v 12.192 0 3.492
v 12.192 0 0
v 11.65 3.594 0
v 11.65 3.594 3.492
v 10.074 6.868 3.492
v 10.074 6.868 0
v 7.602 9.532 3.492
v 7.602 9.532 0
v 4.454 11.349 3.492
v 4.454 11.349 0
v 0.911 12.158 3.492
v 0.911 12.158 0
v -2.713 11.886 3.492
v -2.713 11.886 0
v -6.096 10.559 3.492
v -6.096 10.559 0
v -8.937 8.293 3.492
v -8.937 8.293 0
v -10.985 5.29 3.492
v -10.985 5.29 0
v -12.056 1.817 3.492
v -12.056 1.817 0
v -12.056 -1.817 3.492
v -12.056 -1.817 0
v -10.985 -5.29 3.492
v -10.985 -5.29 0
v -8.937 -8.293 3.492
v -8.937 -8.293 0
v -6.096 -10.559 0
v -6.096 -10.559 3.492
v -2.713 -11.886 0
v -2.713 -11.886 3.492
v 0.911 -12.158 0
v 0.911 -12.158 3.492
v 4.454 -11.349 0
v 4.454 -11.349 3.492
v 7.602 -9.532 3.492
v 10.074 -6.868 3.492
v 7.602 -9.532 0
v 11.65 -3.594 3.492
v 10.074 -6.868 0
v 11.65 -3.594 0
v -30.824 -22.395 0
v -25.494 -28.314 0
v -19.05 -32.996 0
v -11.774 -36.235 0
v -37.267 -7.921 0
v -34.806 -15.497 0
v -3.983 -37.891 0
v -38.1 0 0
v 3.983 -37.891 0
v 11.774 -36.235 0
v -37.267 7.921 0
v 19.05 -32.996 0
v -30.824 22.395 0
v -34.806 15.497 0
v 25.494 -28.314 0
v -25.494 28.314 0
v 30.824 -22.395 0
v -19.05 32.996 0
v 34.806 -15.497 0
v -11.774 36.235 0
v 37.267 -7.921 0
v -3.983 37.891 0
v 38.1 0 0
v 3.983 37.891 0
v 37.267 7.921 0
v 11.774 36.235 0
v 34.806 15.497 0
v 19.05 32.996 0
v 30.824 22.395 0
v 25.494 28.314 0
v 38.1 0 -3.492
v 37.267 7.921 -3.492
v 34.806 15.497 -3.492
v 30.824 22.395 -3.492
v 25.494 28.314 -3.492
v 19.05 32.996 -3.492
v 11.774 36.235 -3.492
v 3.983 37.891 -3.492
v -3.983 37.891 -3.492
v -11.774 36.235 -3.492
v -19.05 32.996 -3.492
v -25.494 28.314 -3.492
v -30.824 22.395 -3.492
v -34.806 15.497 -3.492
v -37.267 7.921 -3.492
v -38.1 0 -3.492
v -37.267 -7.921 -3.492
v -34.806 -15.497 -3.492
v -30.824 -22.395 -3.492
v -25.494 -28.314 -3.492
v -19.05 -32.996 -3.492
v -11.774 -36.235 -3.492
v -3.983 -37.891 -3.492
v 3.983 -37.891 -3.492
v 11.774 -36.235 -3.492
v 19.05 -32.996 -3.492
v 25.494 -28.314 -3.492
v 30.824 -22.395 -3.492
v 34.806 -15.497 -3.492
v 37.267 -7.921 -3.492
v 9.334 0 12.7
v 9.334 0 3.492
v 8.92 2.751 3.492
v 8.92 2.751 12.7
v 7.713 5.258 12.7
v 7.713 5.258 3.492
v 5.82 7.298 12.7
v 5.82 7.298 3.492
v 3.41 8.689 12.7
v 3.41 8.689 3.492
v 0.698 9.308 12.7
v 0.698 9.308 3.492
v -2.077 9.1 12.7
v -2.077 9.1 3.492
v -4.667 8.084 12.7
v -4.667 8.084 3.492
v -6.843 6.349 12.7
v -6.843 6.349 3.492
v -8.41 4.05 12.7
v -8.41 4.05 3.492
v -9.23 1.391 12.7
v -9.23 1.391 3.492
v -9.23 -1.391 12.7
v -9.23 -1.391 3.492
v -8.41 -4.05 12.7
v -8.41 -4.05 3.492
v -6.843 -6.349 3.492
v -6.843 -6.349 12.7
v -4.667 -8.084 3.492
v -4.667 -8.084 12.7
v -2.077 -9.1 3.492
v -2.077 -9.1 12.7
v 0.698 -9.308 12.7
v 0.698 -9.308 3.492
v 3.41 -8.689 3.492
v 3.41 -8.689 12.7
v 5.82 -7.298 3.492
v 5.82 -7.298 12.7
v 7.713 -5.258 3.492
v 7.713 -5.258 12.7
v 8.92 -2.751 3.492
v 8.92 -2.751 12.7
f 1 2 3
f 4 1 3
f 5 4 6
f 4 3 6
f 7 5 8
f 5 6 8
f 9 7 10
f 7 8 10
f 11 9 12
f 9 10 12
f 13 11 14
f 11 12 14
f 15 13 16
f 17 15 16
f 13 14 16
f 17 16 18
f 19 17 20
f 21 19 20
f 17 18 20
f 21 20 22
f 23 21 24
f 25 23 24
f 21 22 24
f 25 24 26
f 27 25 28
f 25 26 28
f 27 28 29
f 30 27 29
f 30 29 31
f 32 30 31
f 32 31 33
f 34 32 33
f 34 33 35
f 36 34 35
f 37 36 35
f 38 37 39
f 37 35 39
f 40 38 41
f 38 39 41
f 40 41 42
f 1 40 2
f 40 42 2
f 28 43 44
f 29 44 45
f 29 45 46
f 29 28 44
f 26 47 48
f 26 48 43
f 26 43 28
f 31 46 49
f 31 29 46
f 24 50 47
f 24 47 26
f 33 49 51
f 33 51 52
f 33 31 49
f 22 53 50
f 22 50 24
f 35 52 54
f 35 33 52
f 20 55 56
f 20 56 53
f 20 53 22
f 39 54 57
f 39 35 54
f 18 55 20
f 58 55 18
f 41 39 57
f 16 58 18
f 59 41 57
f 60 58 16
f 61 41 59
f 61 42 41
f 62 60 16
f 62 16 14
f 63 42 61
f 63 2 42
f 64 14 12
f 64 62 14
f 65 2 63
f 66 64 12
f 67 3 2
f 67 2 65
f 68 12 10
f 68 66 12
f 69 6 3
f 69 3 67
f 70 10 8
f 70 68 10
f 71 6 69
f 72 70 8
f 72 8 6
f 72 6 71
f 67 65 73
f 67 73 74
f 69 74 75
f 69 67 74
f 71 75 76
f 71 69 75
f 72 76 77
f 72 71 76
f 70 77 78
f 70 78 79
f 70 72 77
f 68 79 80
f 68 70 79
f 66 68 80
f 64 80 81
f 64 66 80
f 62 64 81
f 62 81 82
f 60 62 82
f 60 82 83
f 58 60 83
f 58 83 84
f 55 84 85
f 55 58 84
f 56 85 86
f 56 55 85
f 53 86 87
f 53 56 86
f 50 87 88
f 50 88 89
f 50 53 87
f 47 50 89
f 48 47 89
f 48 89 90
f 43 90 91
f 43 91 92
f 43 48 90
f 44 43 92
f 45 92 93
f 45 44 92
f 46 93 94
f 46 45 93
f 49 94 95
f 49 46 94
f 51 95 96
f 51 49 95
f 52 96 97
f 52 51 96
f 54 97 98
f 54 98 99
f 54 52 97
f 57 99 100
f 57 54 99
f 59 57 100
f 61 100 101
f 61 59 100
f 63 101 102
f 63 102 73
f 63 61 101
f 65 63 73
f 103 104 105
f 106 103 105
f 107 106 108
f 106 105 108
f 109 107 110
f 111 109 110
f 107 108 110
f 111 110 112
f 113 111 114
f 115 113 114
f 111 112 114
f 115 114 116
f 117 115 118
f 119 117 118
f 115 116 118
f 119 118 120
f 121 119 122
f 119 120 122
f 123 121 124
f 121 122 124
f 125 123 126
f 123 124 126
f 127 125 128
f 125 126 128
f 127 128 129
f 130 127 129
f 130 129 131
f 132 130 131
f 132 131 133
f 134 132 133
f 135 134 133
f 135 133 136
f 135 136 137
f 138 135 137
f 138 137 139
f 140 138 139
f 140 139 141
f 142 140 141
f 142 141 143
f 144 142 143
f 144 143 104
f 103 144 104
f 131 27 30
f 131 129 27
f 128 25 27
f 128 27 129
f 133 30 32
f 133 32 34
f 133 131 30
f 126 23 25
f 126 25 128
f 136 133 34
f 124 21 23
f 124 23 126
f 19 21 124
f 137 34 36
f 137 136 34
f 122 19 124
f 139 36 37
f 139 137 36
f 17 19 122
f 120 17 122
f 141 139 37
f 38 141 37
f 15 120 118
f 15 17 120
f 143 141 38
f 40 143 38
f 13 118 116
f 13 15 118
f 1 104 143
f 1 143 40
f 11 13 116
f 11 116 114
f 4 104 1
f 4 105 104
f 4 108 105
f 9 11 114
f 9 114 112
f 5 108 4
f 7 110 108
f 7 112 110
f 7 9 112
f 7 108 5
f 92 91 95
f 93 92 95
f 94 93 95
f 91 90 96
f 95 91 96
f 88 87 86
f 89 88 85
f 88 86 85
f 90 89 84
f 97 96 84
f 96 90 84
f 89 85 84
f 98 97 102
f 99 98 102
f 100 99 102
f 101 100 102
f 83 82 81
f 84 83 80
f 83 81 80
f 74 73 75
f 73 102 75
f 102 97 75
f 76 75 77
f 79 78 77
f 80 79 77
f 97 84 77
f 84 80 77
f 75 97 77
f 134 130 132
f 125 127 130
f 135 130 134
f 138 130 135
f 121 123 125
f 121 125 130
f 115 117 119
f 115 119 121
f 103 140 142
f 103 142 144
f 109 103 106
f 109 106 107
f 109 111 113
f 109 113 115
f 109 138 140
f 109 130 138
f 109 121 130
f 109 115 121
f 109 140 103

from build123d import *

# Parameters (mm, degrees)
F0_R     = 12.192
F0_R_2   = 9.3345
F1_DEPTH = 3.4925
F2_DEPTH = 12.7
F0_R_3   = 38.1
F3_DEPTH = 3.4925


with BuildPart() as f1:
    # F0 (on Top) → F1 (new body)
    with BuildSketch(Plane.XY):
        Circle(F0_R)
        Circle(F0_R_2, mode=Mode.SUBTRACT)
    extrude(amount=F1_DEPTH)

    # F0 (on Top) → F2 (join)
    with BuildSketch(Plane.XY):
        Circle(F0_R_2)
    extrude(amount=F2_DEPTH)

    # F0 (on Top) → F3 (join)
    with BuildSketch(Plane.XY):
        Circle(F0_R_3)
        Circle(F0_R, mode=Mode.SUBTRACT)
        Circle(F0_R)
        Circle(F0_R_2, mode=Mode.SUBTRACT)
        Circle(F0_R_2)
    extrude(amount=-F3_DEPTH)


solid = f1.part
